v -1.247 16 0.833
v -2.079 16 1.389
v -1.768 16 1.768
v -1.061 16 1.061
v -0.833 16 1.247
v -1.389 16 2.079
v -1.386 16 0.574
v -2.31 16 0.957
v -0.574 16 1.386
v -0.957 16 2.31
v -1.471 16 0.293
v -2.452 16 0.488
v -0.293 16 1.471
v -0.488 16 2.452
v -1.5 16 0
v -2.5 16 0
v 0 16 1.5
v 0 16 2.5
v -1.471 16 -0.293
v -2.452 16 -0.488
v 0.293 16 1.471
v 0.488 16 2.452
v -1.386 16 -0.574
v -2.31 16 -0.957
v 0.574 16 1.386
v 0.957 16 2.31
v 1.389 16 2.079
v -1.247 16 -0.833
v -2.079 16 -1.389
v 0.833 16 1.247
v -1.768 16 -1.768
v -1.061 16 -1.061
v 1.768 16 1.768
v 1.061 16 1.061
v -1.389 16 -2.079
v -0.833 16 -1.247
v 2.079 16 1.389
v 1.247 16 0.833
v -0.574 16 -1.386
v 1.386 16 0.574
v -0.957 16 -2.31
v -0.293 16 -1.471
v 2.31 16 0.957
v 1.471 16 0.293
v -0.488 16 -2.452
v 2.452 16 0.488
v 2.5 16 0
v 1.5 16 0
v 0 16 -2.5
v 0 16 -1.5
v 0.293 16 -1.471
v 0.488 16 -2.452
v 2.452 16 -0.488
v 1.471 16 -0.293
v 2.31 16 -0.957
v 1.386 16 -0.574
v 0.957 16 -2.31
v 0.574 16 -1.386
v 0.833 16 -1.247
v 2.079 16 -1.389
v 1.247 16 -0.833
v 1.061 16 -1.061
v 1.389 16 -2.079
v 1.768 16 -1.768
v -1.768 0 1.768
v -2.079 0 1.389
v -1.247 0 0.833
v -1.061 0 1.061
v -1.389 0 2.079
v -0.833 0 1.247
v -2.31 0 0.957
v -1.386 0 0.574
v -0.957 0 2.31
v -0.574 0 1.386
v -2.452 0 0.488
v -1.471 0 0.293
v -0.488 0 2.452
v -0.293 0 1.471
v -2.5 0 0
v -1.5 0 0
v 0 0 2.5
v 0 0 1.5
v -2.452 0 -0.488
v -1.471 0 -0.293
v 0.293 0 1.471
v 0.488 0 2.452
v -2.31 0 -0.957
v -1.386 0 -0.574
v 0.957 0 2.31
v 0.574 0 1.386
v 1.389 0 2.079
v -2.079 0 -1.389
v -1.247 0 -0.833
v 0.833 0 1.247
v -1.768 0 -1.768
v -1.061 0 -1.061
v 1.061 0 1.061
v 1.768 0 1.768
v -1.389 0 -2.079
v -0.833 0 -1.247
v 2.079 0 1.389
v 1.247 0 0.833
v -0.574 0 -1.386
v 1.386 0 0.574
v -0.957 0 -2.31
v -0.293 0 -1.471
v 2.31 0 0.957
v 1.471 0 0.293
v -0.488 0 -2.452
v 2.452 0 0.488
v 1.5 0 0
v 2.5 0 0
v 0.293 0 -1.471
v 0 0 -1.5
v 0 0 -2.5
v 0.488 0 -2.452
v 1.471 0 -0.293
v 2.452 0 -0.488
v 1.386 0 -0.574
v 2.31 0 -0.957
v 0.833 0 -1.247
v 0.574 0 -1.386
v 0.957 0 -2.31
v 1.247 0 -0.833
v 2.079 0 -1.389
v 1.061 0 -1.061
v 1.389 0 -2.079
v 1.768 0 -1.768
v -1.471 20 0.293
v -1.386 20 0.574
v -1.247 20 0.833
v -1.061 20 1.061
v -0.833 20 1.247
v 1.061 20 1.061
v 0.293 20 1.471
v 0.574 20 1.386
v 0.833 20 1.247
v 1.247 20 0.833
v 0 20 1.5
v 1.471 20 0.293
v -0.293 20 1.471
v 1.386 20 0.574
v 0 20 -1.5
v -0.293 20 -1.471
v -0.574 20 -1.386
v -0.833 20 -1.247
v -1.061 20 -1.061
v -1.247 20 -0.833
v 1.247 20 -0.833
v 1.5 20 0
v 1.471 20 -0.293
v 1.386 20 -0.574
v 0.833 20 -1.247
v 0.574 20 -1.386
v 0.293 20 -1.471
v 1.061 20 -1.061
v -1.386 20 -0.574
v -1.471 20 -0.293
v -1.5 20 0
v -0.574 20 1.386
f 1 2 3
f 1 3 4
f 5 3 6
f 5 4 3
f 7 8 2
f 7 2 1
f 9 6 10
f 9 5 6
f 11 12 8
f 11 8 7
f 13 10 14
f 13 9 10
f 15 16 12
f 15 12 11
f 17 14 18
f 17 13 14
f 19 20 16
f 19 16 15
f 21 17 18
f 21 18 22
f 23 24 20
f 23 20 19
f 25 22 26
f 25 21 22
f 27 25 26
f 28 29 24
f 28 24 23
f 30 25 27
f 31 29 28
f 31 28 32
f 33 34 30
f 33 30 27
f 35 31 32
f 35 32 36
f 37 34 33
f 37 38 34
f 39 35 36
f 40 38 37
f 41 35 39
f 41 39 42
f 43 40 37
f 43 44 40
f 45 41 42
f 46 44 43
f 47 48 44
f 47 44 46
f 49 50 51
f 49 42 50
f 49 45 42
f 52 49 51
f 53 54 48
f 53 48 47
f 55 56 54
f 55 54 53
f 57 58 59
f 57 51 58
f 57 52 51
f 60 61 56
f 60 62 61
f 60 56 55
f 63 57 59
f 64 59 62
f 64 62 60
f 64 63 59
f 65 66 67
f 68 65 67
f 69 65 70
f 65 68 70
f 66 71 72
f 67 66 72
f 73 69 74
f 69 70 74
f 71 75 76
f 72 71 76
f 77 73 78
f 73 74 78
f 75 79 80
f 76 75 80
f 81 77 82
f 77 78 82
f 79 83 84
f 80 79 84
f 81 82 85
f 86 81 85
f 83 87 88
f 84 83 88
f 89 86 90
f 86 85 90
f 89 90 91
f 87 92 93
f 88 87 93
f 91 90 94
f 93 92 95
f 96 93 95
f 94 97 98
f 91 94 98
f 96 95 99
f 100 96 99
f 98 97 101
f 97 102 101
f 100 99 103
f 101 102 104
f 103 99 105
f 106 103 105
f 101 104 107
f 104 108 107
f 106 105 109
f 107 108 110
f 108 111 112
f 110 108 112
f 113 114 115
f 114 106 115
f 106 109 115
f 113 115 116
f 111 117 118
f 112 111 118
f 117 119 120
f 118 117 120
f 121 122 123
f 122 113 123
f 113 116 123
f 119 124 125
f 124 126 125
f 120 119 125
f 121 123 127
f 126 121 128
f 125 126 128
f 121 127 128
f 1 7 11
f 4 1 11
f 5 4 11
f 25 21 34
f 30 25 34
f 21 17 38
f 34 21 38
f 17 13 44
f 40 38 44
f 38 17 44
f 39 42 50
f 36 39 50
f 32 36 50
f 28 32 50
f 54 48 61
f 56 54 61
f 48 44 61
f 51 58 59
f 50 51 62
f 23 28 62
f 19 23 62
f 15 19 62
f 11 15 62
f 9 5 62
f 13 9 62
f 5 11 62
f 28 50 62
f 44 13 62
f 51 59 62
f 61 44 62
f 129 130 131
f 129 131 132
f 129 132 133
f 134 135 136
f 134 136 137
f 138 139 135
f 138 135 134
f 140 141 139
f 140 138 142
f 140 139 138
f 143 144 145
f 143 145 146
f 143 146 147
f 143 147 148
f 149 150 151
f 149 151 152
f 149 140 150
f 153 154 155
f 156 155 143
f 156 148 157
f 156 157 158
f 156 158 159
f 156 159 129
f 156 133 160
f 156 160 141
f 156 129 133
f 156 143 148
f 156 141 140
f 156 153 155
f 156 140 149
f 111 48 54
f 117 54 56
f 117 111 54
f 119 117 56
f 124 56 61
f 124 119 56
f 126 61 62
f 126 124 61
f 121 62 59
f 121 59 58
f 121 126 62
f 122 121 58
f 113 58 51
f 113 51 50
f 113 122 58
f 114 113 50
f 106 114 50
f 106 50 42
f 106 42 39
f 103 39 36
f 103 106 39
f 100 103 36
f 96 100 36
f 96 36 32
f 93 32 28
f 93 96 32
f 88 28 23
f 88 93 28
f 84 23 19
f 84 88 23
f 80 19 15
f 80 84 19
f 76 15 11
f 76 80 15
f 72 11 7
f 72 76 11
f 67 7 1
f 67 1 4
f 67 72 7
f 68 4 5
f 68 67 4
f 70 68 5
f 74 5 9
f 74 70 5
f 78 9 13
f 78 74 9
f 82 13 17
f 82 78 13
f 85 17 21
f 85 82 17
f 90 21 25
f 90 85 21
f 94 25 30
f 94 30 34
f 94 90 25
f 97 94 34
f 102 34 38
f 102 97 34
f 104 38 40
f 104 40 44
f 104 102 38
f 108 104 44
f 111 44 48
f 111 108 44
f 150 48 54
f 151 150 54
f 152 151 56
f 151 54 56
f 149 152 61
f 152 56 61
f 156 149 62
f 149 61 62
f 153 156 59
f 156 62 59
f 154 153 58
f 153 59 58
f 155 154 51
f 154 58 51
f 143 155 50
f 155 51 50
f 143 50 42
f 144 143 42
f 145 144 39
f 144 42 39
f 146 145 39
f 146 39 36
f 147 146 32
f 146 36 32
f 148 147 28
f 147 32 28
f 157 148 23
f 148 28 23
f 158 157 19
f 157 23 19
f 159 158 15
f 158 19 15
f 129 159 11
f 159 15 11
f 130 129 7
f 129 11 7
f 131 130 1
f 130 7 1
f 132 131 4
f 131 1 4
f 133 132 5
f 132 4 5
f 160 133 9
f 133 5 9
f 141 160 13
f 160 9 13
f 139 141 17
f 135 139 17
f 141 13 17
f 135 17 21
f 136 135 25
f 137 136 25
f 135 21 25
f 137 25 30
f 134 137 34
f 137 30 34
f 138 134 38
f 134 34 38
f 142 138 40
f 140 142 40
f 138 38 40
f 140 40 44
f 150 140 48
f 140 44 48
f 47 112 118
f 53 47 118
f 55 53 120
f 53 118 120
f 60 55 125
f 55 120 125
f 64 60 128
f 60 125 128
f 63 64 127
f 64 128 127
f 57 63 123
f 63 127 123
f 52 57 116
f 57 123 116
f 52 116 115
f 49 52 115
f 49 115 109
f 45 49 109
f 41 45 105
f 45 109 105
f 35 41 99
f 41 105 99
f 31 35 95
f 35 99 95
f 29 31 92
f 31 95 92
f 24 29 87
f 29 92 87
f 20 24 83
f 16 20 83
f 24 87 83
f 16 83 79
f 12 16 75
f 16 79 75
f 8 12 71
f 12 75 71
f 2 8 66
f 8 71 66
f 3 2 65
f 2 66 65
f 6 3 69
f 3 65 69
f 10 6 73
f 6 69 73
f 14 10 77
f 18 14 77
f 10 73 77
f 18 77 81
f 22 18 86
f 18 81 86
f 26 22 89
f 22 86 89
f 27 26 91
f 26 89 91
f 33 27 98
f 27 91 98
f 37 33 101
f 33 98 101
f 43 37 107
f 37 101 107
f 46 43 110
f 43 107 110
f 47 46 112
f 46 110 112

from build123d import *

# Parameters (mm, degrees)
SKETCH_1_R      = 2.5
SKETCH_1_R_2    = 1.5
EXTRUDE_1_DEPTH = 16
SKETCH_2_R      = 1.5
EXTRUDE_2_DEPTH = 4


with BuildPart() as part:
    # 草图1 → 凸台-拉伸1 (new body)
    with BuildSketch(Plane(origin=(0, 0, 0), x_dir=(1, 0, 0), z_dir=(0, 1, 0))):
        Circle(SKETCH_1_R)
        Circle(SKETCH_1_R_2, mode=Mode.SUBTRACT)
    extrude(amount=EXTRUDE_1_DEPTH)


with BuildPart() as body_2:
    # 草图2 → 凸台-拉伸2 (new body)
    with BuildSketch(Plane(origin=(0, 16, 0), x_dir=(1, 0, 0), z_dir=(0, 1, 0))):
        Circle(SKETCH_2_R)
    extrude(amount=EXTRUDE_2_DEPTH)


solid = Compound([part.part, body_2.part])
